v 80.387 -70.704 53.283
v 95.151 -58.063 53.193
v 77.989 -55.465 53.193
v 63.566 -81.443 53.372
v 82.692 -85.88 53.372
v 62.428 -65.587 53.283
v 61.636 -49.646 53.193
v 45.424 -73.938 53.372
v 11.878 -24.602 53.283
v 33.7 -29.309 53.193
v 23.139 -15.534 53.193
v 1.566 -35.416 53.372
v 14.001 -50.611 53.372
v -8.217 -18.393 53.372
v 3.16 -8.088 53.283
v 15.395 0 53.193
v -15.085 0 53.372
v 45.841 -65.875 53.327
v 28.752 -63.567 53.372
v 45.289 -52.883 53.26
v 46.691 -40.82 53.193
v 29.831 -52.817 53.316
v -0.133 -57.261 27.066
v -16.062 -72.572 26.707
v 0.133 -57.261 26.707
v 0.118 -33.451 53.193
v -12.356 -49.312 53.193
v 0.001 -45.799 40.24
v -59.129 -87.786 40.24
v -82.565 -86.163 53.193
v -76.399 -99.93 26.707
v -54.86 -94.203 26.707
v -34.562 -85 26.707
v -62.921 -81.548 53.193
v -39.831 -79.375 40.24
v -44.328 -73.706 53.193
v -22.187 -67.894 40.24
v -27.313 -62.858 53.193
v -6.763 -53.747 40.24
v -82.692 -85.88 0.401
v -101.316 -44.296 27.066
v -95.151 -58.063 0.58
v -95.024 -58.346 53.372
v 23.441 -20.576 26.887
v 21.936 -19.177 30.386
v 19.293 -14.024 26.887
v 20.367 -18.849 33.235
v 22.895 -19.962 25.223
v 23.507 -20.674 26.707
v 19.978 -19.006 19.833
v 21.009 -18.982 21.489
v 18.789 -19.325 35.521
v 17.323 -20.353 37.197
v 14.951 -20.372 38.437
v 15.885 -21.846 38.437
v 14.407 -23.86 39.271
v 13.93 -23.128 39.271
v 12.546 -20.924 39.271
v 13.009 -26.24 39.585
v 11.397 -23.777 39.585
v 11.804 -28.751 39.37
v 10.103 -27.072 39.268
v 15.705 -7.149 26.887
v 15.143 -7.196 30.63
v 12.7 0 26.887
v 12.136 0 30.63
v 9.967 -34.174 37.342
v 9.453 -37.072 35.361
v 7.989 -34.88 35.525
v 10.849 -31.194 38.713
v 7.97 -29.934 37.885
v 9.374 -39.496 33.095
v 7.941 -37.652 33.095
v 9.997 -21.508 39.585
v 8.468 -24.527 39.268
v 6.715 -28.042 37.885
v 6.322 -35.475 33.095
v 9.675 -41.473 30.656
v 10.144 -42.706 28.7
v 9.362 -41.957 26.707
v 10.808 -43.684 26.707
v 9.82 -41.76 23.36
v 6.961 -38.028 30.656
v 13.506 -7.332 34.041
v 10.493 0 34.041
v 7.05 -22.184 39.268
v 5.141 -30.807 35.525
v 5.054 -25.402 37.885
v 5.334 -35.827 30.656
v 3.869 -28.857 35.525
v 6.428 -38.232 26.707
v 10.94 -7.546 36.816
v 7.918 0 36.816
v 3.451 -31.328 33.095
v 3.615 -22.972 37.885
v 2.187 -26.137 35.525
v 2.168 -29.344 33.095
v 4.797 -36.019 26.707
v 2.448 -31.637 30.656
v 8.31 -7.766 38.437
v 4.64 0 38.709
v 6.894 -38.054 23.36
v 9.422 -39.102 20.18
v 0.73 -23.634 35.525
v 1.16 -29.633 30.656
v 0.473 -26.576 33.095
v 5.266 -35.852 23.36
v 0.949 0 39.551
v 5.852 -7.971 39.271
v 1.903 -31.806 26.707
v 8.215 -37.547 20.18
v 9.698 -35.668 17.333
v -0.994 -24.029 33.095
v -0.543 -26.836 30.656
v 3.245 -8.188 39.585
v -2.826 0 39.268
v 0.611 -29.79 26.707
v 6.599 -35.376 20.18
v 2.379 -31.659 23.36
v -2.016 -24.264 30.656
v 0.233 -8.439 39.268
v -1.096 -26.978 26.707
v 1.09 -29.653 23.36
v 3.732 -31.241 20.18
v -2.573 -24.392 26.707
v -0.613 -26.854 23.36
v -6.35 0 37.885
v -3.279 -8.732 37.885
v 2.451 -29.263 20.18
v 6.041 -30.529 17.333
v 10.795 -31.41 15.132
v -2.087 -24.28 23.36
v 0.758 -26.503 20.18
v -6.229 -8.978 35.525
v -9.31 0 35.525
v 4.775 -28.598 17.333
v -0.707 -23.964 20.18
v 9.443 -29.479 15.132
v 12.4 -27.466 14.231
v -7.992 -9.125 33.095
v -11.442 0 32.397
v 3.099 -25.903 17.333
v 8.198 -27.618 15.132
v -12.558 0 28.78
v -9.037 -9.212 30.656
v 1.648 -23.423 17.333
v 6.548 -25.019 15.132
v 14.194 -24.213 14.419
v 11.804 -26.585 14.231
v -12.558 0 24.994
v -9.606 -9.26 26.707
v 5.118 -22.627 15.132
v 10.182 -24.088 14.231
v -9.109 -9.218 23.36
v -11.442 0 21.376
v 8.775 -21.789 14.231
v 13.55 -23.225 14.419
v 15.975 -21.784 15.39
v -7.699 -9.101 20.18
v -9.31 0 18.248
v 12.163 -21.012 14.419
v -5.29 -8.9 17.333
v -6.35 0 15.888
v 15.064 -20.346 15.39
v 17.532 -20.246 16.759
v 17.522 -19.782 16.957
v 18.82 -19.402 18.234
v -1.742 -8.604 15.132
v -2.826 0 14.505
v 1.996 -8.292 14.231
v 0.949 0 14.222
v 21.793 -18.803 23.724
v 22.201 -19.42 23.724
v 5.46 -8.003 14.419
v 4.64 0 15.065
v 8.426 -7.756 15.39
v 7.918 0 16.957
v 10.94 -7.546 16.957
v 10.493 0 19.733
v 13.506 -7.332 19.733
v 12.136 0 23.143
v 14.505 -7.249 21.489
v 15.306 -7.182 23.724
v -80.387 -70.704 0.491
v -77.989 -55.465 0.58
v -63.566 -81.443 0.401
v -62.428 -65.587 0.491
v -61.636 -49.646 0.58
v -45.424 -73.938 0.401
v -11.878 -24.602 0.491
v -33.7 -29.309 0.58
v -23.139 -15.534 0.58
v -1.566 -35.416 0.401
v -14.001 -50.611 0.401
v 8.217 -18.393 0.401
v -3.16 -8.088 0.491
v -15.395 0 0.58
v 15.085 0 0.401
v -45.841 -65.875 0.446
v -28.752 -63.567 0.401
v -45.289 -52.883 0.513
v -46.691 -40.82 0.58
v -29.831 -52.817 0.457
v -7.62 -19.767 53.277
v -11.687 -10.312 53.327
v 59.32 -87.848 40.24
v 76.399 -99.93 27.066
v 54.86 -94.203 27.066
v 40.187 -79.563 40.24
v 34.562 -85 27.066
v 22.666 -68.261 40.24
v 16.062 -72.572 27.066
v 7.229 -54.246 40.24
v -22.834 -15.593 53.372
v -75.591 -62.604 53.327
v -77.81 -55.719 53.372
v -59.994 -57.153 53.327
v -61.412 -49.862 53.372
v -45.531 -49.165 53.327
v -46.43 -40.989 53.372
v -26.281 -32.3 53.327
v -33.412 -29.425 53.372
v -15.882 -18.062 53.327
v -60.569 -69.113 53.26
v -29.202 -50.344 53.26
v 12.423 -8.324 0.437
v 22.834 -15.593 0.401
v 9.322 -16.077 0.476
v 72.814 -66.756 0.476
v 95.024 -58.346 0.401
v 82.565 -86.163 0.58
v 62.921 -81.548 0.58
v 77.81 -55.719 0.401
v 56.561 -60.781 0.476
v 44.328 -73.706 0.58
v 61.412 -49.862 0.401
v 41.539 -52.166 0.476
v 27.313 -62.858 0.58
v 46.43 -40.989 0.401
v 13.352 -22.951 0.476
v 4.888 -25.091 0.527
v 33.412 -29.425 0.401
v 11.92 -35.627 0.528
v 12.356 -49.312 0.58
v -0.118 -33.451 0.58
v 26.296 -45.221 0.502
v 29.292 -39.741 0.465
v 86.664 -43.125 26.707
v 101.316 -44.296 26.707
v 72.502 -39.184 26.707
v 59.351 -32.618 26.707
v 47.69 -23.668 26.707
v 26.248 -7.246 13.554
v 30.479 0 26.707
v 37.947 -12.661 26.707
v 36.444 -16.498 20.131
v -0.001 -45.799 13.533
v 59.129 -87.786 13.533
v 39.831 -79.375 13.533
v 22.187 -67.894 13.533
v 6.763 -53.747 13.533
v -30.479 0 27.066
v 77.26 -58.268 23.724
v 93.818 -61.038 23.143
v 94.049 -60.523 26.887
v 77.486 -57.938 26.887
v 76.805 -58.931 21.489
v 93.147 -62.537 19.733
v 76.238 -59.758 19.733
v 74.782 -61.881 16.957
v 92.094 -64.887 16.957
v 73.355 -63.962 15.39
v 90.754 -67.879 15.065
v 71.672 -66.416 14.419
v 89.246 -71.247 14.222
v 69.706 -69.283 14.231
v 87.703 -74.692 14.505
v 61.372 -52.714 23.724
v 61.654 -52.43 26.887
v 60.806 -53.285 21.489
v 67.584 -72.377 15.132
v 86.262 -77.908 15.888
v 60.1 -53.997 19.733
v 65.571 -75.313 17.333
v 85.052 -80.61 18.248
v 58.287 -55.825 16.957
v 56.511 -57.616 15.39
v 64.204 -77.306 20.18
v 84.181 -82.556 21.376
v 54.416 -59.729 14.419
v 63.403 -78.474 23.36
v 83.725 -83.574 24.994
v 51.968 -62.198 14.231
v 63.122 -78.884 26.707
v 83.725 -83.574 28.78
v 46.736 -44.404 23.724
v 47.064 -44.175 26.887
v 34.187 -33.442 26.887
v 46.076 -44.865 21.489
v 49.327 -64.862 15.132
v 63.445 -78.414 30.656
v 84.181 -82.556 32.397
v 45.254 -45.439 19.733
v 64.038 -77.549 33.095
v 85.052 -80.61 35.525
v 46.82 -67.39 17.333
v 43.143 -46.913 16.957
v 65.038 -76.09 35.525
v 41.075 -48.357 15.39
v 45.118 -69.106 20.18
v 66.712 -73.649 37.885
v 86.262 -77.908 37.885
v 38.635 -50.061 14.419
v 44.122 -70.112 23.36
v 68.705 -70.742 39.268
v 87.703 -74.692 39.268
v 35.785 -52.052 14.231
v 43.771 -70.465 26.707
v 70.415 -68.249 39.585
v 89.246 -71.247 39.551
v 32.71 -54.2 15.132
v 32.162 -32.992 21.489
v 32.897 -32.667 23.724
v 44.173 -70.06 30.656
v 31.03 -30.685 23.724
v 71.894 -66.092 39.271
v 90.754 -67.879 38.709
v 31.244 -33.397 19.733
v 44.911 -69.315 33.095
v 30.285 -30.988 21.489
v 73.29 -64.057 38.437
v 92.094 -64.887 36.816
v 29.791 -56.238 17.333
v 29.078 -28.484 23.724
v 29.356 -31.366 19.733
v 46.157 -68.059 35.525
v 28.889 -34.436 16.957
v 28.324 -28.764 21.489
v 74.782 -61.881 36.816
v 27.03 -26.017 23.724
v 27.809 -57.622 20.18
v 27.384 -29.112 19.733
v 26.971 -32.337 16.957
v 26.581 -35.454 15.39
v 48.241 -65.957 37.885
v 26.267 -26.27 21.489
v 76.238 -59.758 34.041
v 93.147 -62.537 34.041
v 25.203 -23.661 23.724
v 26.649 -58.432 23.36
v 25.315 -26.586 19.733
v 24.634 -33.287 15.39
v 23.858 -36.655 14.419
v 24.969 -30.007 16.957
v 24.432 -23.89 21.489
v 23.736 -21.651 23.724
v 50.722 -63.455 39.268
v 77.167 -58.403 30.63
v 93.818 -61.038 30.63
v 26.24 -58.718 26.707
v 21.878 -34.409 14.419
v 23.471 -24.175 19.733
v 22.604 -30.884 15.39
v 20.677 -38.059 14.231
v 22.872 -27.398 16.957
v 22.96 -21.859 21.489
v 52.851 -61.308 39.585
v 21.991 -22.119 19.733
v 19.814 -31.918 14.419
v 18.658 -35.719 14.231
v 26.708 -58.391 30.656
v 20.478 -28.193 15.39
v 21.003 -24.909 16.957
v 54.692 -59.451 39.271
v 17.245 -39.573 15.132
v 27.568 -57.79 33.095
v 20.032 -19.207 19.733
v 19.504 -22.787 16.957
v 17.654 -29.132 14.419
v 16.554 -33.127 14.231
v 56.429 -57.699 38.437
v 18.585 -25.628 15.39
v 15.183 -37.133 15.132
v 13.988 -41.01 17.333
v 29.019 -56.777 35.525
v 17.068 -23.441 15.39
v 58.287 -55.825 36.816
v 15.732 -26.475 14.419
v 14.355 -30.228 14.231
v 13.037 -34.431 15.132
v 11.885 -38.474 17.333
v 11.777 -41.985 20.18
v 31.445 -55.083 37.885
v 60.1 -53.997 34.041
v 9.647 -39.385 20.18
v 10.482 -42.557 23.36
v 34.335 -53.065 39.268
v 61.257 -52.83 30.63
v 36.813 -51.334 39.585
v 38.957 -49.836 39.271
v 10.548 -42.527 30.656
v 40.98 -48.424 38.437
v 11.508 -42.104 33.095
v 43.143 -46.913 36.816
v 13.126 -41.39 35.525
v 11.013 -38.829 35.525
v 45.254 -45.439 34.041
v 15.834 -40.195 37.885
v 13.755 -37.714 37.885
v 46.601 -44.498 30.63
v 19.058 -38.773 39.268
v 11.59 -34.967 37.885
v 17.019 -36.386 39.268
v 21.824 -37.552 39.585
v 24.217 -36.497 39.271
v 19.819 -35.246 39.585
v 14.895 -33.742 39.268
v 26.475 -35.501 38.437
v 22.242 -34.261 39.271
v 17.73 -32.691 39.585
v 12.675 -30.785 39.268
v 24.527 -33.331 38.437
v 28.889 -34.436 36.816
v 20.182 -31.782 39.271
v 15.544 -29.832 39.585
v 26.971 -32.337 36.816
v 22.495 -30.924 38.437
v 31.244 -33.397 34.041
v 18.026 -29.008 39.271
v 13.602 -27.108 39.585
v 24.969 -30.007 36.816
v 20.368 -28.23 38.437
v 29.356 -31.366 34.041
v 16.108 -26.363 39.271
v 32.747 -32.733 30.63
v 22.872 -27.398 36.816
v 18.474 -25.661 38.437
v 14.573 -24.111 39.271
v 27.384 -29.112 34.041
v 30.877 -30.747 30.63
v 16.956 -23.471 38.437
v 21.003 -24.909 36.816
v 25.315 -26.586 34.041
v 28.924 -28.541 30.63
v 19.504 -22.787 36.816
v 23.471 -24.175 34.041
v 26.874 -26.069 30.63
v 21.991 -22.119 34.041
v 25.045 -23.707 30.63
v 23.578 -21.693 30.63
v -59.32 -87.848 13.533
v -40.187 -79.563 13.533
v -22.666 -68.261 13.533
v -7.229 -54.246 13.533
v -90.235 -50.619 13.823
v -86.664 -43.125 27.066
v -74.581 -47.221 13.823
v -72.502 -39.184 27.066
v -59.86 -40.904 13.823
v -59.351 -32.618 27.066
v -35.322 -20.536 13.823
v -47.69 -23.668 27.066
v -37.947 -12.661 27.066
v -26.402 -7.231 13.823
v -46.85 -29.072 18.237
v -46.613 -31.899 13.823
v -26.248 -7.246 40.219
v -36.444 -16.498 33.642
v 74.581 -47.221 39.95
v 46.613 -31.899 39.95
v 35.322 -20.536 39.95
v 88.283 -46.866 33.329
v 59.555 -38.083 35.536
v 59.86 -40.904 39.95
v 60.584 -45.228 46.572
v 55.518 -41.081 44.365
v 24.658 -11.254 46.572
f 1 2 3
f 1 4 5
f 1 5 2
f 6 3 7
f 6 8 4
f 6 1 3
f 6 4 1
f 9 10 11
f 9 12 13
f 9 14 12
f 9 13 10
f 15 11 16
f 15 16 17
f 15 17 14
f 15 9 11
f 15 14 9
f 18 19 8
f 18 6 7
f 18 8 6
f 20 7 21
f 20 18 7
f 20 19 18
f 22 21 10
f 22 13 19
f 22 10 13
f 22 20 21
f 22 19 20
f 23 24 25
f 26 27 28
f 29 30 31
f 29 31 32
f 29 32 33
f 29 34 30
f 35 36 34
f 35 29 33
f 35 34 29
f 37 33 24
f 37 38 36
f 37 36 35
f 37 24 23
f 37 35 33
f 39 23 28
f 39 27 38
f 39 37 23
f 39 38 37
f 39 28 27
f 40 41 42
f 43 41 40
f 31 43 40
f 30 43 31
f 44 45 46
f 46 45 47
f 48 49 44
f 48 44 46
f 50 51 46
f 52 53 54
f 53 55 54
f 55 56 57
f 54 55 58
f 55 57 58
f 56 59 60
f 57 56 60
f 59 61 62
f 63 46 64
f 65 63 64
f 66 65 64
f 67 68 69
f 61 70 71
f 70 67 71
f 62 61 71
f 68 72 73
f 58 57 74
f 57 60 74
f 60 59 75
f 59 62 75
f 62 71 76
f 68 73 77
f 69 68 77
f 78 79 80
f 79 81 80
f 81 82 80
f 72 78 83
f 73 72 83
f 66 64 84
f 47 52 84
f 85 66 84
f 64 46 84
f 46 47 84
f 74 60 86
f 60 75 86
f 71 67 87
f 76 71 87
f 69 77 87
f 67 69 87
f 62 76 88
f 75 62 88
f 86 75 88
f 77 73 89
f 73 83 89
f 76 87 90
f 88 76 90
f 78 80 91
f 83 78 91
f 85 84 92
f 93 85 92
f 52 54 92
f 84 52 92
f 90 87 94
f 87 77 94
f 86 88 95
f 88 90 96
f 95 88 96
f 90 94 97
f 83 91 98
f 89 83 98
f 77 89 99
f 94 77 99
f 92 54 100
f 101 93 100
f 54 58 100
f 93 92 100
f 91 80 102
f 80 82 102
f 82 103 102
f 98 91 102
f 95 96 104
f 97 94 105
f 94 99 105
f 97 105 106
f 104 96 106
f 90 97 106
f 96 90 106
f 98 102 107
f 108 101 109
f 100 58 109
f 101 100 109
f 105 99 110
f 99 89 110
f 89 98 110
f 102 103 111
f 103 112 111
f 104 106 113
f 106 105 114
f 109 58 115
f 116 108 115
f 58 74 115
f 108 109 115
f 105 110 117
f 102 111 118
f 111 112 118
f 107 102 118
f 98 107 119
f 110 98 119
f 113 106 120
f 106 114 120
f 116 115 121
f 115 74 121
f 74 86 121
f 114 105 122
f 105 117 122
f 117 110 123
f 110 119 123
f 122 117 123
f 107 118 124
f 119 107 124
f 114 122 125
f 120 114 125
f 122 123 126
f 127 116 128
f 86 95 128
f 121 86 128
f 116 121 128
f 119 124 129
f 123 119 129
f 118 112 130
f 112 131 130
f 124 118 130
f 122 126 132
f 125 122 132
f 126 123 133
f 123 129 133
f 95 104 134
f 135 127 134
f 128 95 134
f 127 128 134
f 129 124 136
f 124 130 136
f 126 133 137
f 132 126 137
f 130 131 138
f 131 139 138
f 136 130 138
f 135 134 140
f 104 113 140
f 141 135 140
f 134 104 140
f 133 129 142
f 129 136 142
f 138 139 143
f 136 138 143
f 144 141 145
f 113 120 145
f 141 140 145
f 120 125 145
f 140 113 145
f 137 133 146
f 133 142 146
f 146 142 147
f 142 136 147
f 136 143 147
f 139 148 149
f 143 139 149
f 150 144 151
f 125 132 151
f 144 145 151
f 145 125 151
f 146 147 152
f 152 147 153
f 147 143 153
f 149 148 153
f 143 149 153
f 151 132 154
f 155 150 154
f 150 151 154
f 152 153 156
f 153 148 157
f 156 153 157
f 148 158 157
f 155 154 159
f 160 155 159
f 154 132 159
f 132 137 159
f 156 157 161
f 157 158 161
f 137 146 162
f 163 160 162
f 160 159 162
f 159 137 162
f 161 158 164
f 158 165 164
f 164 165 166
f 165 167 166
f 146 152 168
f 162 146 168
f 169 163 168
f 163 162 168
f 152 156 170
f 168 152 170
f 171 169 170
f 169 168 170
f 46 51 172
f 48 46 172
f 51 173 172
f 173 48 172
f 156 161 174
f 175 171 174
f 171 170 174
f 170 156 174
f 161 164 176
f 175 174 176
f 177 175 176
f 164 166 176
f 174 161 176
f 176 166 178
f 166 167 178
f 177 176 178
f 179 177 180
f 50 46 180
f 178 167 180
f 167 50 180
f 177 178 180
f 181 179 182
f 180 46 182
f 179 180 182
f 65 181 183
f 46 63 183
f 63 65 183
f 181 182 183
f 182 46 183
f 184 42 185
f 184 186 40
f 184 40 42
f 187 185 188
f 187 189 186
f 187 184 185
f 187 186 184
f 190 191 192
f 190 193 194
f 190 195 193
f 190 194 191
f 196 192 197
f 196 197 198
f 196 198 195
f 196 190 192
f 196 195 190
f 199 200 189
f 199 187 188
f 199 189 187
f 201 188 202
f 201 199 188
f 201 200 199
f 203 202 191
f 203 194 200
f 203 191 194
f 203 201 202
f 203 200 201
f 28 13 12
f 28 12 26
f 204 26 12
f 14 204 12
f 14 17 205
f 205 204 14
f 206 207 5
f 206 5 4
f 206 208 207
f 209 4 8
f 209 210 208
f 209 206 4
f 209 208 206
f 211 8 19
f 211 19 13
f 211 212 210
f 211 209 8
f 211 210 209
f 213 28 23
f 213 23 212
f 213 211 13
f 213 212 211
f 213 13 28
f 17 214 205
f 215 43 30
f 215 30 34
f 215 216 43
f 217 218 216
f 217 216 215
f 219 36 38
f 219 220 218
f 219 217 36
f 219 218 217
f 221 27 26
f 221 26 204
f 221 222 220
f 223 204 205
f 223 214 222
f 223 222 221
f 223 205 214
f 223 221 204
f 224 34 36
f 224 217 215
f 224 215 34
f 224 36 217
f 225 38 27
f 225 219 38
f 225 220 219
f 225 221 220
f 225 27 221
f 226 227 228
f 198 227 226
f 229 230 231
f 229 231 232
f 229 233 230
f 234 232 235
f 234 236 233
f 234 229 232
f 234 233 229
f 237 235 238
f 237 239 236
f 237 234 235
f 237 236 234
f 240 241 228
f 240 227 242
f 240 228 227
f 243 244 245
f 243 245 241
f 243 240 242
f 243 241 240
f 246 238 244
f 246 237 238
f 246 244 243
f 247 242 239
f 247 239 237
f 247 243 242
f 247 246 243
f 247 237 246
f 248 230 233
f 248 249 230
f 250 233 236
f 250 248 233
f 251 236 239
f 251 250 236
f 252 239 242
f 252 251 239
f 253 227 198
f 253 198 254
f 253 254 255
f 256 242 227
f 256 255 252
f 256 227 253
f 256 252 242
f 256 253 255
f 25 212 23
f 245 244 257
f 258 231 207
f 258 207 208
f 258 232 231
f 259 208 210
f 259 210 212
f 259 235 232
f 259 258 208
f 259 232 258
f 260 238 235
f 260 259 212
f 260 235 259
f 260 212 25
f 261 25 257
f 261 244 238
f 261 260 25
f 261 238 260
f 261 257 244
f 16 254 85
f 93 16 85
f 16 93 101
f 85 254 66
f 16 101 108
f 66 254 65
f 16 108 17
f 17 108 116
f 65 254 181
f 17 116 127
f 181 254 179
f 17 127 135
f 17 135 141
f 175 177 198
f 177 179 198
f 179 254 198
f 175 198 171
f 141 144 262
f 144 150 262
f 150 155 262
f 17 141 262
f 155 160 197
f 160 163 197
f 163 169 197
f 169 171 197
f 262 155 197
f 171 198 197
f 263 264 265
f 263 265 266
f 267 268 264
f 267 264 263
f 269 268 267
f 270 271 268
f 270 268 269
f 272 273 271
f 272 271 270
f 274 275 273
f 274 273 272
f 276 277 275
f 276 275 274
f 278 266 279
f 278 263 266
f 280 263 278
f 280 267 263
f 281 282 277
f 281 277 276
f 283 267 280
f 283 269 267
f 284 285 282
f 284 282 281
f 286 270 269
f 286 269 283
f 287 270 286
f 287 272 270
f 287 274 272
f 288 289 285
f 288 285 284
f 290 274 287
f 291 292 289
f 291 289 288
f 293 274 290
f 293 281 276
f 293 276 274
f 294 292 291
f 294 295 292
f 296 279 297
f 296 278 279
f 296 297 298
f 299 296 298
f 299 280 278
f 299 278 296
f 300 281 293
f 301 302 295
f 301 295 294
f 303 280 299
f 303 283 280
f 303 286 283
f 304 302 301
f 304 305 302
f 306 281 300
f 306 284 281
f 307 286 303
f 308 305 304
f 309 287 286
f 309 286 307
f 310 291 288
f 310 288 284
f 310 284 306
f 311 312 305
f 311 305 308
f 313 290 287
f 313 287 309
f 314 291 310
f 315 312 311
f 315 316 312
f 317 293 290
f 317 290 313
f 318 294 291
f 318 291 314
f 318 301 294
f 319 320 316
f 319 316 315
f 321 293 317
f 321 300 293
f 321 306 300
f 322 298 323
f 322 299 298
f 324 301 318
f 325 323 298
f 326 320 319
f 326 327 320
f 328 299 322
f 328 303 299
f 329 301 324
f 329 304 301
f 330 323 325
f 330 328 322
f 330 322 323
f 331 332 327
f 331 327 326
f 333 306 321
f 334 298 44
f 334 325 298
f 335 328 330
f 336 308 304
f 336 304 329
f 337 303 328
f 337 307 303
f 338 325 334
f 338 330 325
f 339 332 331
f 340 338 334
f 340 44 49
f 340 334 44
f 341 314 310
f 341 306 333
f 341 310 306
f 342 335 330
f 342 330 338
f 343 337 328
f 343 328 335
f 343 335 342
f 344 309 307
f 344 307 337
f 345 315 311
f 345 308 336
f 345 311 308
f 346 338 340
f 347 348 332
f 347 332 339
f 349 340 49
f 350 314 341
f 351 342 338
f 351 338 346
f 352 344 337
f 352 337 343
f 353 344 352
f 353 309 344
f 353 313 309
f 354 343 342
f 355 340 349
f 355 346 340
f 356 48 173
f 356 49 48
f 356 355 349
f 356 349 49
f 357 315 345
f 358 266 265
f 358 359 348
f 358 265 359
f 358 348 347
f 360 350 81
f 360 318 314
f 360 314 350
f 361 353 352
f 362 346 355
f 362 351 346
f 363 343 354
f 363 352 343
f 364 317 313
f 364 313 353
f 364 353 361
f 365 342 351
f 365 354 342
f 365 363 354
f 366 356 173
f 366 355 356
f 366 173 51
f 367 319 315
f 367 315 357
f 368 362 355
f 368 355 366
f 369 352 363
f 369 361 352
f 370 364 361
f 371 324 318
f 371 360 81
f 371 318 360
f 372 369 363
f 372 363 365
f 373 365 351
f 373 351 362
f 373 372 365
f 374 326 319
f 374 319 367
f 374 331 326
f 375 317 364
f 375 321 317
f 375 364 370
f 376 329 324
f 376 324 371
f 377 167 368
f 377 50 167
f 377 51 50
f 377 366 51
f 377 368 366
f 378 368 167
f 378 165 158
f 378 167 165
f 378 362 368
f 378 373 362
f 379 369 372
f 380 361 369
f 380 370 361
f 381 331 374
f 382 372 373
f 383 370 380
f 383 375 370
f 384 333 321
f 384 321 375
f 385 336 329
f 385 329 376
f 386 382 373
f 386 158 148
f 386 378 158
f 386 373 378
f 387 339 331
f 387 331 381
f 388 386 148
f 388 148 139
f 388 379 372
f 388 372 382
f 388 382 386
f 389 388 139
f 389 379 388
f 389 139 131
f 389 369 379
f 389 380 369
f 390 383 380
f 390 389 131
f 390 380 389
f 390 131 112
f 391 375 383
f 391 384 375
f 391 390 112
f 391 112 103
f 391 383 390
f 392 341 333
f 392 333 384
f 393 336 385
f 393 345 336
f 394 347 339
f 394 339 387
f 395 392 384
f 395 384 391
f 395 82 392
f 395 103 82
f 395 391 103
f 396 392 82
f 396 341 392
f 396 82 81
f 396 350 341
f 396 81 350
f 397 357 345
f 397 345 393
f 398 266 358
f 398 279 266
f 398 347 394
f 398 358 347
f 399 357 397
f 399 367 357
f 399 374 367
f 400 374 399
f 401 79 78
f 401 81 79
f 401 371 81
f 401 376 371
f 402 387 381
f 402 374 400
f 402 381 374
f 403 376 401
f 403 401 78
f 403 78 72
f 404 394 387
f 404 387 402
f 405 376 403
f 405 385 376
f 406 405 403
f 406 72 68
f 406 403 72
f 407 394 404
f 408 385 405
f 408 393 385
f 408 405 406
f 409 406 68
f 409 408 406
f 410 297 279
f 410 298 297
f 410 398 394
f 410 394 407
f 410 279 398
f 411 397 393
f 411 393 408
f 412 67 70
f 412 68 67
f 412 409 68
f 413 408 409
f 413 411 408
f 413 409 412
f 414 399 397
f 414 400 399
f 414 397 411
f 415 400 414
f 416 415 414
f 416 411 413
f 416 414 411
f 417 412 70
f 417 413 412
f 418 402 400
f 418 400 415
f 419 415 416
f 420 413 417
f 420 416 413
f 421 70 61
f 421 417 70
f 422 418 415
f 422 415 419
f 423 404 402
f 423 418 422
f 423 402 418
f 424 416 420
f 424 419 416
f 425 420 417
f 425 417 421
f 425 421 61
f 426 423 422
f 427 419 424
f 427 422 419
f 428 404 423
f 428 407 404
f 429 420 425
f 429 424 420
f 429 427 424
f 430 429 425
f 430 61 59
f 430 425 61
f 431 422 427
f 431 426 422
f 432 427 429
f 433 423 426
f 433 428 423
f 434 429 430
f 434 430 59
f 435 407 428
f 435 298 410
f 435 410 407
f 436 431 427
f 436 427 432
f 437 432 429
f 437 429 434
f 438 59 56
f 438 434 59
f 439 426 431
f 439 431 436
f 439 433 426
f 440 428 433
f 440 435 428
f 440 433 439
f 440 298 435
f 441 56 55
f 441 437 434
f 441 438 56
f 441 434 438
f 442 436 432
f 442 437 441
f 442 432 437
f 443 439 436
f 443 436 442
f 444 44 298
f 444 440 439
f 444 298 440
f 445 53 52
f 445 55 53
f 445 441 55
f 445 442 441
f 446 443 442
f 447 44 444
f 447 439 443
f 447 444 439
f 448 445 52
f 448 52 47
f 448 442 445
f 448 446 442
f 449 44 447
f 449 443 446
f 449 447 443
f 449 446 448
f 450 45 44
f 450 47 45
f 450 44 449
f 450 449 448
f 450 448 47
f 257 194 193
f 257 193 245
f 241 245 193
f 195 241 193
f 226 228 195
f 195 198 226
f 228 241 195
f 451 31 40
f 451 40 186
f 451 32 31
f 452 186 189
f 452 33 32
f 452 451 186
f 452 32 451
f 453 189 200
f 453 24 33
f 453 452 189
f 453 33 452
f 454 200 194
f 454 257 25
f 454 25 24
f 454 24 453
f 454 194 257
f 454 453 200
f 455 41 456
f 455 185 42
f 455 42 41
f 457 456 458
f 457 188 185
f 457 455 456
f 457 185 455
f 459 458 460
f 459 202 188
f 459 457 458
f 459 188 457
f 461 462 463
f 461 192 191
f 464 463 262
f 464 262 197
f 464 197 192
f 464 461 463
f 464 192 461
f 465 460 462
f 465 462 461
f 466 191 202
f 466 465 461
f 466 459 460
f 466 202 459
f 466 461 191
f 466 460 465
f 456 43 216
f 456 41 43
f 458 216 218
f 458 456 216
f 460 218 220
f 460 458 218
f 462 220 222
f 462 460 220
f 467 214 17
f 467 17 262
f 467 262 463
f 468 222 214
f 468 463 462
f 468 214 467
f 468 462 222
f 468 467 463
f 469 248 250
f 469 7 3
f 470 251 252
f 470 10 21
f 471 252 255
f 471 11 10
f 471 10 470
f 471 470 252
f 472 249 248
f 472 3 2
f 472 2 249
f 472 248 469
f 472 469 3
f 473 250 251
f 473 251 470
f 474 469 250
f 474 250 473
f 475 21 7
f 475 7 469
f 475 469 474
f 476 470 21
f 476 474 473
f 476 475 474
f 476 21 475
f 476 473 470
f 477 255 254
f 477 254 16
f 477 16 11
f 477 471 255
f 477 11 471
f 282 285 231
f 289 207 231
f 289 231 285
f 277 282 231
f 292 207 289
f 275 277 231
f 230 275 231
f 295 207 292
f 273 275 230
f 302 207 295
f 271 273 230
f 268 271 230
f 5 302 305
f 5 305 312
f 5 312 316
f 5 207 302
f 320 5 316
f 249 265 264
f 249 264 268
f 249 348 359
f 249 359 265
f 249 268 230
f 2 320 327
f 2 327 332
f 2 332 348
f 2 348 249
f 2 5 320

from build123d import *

# Parameters (mm, degrees)
F0_R = 12.7


with BuildPart() as f2:
    # F2: sweep along a path in F1
    with BuildLine(Plane.XY) as f2_path:
        ThreePointArc((-88.857807, -72.113179), (-33.770109, -49.190349), (0, 0))
    # F0 (on Front) → F2 (sweep)
    with BuildSketch(Plane.XZ):
        Polygon((-30.479473, 27.065896), (-15.394954, 0.580283), (15.084519, 0.401054), (30.479473, 26.707437), (15.394954, 53.19305), (-15.084519, 53.372279), align=None)
        with Locations((0, 26.886667)):
            Circle(F0_R, mode=Mode.SUBTRACT)
        with Locations((0, 26.886667)):
            Circle(F0_R)
    sweep(path=f2_path.line)

    # F3: sweep along a path in F1
    with BuildLine(Plane.XY) as f3_path:
        ThreePointArc((88.857807, -72.113179), (33.770109, -49.190349), (0, 0))
    # F0 (on Front) → F3 (sweep)
    with BuildSketch(Plane.XZ):
        Polygon((-30.479473, 27.065896), (-15.394954, 0.580283), (15.084519, 0.401054), (30.479473, 26.707437), (15.394954, 53.19305), (-15.084519, 53.372279), align=None)
        with Locations((0, 26.886667)):
            Circle(F0_R, mode=Mode.SUBTRACT)
    sweep(path=f3_path.line)

    # F4: sweep along a path in F1
    with BuildLine(Plane.XY) as f4_path:
        ThreePointArc((88.857807, -72.113179), (33.770109, -49.190349), (0, 0))
    # F0 (on Front) → F4 (sweep, cut)
    with BuildSketch(Plane.XZ):
        with Locations((0, 26.886667)):
            Circle(F0_R)
    sweep(path=f4_path.line, mode=Mode.SUBTRACT)


solid = f2.part
